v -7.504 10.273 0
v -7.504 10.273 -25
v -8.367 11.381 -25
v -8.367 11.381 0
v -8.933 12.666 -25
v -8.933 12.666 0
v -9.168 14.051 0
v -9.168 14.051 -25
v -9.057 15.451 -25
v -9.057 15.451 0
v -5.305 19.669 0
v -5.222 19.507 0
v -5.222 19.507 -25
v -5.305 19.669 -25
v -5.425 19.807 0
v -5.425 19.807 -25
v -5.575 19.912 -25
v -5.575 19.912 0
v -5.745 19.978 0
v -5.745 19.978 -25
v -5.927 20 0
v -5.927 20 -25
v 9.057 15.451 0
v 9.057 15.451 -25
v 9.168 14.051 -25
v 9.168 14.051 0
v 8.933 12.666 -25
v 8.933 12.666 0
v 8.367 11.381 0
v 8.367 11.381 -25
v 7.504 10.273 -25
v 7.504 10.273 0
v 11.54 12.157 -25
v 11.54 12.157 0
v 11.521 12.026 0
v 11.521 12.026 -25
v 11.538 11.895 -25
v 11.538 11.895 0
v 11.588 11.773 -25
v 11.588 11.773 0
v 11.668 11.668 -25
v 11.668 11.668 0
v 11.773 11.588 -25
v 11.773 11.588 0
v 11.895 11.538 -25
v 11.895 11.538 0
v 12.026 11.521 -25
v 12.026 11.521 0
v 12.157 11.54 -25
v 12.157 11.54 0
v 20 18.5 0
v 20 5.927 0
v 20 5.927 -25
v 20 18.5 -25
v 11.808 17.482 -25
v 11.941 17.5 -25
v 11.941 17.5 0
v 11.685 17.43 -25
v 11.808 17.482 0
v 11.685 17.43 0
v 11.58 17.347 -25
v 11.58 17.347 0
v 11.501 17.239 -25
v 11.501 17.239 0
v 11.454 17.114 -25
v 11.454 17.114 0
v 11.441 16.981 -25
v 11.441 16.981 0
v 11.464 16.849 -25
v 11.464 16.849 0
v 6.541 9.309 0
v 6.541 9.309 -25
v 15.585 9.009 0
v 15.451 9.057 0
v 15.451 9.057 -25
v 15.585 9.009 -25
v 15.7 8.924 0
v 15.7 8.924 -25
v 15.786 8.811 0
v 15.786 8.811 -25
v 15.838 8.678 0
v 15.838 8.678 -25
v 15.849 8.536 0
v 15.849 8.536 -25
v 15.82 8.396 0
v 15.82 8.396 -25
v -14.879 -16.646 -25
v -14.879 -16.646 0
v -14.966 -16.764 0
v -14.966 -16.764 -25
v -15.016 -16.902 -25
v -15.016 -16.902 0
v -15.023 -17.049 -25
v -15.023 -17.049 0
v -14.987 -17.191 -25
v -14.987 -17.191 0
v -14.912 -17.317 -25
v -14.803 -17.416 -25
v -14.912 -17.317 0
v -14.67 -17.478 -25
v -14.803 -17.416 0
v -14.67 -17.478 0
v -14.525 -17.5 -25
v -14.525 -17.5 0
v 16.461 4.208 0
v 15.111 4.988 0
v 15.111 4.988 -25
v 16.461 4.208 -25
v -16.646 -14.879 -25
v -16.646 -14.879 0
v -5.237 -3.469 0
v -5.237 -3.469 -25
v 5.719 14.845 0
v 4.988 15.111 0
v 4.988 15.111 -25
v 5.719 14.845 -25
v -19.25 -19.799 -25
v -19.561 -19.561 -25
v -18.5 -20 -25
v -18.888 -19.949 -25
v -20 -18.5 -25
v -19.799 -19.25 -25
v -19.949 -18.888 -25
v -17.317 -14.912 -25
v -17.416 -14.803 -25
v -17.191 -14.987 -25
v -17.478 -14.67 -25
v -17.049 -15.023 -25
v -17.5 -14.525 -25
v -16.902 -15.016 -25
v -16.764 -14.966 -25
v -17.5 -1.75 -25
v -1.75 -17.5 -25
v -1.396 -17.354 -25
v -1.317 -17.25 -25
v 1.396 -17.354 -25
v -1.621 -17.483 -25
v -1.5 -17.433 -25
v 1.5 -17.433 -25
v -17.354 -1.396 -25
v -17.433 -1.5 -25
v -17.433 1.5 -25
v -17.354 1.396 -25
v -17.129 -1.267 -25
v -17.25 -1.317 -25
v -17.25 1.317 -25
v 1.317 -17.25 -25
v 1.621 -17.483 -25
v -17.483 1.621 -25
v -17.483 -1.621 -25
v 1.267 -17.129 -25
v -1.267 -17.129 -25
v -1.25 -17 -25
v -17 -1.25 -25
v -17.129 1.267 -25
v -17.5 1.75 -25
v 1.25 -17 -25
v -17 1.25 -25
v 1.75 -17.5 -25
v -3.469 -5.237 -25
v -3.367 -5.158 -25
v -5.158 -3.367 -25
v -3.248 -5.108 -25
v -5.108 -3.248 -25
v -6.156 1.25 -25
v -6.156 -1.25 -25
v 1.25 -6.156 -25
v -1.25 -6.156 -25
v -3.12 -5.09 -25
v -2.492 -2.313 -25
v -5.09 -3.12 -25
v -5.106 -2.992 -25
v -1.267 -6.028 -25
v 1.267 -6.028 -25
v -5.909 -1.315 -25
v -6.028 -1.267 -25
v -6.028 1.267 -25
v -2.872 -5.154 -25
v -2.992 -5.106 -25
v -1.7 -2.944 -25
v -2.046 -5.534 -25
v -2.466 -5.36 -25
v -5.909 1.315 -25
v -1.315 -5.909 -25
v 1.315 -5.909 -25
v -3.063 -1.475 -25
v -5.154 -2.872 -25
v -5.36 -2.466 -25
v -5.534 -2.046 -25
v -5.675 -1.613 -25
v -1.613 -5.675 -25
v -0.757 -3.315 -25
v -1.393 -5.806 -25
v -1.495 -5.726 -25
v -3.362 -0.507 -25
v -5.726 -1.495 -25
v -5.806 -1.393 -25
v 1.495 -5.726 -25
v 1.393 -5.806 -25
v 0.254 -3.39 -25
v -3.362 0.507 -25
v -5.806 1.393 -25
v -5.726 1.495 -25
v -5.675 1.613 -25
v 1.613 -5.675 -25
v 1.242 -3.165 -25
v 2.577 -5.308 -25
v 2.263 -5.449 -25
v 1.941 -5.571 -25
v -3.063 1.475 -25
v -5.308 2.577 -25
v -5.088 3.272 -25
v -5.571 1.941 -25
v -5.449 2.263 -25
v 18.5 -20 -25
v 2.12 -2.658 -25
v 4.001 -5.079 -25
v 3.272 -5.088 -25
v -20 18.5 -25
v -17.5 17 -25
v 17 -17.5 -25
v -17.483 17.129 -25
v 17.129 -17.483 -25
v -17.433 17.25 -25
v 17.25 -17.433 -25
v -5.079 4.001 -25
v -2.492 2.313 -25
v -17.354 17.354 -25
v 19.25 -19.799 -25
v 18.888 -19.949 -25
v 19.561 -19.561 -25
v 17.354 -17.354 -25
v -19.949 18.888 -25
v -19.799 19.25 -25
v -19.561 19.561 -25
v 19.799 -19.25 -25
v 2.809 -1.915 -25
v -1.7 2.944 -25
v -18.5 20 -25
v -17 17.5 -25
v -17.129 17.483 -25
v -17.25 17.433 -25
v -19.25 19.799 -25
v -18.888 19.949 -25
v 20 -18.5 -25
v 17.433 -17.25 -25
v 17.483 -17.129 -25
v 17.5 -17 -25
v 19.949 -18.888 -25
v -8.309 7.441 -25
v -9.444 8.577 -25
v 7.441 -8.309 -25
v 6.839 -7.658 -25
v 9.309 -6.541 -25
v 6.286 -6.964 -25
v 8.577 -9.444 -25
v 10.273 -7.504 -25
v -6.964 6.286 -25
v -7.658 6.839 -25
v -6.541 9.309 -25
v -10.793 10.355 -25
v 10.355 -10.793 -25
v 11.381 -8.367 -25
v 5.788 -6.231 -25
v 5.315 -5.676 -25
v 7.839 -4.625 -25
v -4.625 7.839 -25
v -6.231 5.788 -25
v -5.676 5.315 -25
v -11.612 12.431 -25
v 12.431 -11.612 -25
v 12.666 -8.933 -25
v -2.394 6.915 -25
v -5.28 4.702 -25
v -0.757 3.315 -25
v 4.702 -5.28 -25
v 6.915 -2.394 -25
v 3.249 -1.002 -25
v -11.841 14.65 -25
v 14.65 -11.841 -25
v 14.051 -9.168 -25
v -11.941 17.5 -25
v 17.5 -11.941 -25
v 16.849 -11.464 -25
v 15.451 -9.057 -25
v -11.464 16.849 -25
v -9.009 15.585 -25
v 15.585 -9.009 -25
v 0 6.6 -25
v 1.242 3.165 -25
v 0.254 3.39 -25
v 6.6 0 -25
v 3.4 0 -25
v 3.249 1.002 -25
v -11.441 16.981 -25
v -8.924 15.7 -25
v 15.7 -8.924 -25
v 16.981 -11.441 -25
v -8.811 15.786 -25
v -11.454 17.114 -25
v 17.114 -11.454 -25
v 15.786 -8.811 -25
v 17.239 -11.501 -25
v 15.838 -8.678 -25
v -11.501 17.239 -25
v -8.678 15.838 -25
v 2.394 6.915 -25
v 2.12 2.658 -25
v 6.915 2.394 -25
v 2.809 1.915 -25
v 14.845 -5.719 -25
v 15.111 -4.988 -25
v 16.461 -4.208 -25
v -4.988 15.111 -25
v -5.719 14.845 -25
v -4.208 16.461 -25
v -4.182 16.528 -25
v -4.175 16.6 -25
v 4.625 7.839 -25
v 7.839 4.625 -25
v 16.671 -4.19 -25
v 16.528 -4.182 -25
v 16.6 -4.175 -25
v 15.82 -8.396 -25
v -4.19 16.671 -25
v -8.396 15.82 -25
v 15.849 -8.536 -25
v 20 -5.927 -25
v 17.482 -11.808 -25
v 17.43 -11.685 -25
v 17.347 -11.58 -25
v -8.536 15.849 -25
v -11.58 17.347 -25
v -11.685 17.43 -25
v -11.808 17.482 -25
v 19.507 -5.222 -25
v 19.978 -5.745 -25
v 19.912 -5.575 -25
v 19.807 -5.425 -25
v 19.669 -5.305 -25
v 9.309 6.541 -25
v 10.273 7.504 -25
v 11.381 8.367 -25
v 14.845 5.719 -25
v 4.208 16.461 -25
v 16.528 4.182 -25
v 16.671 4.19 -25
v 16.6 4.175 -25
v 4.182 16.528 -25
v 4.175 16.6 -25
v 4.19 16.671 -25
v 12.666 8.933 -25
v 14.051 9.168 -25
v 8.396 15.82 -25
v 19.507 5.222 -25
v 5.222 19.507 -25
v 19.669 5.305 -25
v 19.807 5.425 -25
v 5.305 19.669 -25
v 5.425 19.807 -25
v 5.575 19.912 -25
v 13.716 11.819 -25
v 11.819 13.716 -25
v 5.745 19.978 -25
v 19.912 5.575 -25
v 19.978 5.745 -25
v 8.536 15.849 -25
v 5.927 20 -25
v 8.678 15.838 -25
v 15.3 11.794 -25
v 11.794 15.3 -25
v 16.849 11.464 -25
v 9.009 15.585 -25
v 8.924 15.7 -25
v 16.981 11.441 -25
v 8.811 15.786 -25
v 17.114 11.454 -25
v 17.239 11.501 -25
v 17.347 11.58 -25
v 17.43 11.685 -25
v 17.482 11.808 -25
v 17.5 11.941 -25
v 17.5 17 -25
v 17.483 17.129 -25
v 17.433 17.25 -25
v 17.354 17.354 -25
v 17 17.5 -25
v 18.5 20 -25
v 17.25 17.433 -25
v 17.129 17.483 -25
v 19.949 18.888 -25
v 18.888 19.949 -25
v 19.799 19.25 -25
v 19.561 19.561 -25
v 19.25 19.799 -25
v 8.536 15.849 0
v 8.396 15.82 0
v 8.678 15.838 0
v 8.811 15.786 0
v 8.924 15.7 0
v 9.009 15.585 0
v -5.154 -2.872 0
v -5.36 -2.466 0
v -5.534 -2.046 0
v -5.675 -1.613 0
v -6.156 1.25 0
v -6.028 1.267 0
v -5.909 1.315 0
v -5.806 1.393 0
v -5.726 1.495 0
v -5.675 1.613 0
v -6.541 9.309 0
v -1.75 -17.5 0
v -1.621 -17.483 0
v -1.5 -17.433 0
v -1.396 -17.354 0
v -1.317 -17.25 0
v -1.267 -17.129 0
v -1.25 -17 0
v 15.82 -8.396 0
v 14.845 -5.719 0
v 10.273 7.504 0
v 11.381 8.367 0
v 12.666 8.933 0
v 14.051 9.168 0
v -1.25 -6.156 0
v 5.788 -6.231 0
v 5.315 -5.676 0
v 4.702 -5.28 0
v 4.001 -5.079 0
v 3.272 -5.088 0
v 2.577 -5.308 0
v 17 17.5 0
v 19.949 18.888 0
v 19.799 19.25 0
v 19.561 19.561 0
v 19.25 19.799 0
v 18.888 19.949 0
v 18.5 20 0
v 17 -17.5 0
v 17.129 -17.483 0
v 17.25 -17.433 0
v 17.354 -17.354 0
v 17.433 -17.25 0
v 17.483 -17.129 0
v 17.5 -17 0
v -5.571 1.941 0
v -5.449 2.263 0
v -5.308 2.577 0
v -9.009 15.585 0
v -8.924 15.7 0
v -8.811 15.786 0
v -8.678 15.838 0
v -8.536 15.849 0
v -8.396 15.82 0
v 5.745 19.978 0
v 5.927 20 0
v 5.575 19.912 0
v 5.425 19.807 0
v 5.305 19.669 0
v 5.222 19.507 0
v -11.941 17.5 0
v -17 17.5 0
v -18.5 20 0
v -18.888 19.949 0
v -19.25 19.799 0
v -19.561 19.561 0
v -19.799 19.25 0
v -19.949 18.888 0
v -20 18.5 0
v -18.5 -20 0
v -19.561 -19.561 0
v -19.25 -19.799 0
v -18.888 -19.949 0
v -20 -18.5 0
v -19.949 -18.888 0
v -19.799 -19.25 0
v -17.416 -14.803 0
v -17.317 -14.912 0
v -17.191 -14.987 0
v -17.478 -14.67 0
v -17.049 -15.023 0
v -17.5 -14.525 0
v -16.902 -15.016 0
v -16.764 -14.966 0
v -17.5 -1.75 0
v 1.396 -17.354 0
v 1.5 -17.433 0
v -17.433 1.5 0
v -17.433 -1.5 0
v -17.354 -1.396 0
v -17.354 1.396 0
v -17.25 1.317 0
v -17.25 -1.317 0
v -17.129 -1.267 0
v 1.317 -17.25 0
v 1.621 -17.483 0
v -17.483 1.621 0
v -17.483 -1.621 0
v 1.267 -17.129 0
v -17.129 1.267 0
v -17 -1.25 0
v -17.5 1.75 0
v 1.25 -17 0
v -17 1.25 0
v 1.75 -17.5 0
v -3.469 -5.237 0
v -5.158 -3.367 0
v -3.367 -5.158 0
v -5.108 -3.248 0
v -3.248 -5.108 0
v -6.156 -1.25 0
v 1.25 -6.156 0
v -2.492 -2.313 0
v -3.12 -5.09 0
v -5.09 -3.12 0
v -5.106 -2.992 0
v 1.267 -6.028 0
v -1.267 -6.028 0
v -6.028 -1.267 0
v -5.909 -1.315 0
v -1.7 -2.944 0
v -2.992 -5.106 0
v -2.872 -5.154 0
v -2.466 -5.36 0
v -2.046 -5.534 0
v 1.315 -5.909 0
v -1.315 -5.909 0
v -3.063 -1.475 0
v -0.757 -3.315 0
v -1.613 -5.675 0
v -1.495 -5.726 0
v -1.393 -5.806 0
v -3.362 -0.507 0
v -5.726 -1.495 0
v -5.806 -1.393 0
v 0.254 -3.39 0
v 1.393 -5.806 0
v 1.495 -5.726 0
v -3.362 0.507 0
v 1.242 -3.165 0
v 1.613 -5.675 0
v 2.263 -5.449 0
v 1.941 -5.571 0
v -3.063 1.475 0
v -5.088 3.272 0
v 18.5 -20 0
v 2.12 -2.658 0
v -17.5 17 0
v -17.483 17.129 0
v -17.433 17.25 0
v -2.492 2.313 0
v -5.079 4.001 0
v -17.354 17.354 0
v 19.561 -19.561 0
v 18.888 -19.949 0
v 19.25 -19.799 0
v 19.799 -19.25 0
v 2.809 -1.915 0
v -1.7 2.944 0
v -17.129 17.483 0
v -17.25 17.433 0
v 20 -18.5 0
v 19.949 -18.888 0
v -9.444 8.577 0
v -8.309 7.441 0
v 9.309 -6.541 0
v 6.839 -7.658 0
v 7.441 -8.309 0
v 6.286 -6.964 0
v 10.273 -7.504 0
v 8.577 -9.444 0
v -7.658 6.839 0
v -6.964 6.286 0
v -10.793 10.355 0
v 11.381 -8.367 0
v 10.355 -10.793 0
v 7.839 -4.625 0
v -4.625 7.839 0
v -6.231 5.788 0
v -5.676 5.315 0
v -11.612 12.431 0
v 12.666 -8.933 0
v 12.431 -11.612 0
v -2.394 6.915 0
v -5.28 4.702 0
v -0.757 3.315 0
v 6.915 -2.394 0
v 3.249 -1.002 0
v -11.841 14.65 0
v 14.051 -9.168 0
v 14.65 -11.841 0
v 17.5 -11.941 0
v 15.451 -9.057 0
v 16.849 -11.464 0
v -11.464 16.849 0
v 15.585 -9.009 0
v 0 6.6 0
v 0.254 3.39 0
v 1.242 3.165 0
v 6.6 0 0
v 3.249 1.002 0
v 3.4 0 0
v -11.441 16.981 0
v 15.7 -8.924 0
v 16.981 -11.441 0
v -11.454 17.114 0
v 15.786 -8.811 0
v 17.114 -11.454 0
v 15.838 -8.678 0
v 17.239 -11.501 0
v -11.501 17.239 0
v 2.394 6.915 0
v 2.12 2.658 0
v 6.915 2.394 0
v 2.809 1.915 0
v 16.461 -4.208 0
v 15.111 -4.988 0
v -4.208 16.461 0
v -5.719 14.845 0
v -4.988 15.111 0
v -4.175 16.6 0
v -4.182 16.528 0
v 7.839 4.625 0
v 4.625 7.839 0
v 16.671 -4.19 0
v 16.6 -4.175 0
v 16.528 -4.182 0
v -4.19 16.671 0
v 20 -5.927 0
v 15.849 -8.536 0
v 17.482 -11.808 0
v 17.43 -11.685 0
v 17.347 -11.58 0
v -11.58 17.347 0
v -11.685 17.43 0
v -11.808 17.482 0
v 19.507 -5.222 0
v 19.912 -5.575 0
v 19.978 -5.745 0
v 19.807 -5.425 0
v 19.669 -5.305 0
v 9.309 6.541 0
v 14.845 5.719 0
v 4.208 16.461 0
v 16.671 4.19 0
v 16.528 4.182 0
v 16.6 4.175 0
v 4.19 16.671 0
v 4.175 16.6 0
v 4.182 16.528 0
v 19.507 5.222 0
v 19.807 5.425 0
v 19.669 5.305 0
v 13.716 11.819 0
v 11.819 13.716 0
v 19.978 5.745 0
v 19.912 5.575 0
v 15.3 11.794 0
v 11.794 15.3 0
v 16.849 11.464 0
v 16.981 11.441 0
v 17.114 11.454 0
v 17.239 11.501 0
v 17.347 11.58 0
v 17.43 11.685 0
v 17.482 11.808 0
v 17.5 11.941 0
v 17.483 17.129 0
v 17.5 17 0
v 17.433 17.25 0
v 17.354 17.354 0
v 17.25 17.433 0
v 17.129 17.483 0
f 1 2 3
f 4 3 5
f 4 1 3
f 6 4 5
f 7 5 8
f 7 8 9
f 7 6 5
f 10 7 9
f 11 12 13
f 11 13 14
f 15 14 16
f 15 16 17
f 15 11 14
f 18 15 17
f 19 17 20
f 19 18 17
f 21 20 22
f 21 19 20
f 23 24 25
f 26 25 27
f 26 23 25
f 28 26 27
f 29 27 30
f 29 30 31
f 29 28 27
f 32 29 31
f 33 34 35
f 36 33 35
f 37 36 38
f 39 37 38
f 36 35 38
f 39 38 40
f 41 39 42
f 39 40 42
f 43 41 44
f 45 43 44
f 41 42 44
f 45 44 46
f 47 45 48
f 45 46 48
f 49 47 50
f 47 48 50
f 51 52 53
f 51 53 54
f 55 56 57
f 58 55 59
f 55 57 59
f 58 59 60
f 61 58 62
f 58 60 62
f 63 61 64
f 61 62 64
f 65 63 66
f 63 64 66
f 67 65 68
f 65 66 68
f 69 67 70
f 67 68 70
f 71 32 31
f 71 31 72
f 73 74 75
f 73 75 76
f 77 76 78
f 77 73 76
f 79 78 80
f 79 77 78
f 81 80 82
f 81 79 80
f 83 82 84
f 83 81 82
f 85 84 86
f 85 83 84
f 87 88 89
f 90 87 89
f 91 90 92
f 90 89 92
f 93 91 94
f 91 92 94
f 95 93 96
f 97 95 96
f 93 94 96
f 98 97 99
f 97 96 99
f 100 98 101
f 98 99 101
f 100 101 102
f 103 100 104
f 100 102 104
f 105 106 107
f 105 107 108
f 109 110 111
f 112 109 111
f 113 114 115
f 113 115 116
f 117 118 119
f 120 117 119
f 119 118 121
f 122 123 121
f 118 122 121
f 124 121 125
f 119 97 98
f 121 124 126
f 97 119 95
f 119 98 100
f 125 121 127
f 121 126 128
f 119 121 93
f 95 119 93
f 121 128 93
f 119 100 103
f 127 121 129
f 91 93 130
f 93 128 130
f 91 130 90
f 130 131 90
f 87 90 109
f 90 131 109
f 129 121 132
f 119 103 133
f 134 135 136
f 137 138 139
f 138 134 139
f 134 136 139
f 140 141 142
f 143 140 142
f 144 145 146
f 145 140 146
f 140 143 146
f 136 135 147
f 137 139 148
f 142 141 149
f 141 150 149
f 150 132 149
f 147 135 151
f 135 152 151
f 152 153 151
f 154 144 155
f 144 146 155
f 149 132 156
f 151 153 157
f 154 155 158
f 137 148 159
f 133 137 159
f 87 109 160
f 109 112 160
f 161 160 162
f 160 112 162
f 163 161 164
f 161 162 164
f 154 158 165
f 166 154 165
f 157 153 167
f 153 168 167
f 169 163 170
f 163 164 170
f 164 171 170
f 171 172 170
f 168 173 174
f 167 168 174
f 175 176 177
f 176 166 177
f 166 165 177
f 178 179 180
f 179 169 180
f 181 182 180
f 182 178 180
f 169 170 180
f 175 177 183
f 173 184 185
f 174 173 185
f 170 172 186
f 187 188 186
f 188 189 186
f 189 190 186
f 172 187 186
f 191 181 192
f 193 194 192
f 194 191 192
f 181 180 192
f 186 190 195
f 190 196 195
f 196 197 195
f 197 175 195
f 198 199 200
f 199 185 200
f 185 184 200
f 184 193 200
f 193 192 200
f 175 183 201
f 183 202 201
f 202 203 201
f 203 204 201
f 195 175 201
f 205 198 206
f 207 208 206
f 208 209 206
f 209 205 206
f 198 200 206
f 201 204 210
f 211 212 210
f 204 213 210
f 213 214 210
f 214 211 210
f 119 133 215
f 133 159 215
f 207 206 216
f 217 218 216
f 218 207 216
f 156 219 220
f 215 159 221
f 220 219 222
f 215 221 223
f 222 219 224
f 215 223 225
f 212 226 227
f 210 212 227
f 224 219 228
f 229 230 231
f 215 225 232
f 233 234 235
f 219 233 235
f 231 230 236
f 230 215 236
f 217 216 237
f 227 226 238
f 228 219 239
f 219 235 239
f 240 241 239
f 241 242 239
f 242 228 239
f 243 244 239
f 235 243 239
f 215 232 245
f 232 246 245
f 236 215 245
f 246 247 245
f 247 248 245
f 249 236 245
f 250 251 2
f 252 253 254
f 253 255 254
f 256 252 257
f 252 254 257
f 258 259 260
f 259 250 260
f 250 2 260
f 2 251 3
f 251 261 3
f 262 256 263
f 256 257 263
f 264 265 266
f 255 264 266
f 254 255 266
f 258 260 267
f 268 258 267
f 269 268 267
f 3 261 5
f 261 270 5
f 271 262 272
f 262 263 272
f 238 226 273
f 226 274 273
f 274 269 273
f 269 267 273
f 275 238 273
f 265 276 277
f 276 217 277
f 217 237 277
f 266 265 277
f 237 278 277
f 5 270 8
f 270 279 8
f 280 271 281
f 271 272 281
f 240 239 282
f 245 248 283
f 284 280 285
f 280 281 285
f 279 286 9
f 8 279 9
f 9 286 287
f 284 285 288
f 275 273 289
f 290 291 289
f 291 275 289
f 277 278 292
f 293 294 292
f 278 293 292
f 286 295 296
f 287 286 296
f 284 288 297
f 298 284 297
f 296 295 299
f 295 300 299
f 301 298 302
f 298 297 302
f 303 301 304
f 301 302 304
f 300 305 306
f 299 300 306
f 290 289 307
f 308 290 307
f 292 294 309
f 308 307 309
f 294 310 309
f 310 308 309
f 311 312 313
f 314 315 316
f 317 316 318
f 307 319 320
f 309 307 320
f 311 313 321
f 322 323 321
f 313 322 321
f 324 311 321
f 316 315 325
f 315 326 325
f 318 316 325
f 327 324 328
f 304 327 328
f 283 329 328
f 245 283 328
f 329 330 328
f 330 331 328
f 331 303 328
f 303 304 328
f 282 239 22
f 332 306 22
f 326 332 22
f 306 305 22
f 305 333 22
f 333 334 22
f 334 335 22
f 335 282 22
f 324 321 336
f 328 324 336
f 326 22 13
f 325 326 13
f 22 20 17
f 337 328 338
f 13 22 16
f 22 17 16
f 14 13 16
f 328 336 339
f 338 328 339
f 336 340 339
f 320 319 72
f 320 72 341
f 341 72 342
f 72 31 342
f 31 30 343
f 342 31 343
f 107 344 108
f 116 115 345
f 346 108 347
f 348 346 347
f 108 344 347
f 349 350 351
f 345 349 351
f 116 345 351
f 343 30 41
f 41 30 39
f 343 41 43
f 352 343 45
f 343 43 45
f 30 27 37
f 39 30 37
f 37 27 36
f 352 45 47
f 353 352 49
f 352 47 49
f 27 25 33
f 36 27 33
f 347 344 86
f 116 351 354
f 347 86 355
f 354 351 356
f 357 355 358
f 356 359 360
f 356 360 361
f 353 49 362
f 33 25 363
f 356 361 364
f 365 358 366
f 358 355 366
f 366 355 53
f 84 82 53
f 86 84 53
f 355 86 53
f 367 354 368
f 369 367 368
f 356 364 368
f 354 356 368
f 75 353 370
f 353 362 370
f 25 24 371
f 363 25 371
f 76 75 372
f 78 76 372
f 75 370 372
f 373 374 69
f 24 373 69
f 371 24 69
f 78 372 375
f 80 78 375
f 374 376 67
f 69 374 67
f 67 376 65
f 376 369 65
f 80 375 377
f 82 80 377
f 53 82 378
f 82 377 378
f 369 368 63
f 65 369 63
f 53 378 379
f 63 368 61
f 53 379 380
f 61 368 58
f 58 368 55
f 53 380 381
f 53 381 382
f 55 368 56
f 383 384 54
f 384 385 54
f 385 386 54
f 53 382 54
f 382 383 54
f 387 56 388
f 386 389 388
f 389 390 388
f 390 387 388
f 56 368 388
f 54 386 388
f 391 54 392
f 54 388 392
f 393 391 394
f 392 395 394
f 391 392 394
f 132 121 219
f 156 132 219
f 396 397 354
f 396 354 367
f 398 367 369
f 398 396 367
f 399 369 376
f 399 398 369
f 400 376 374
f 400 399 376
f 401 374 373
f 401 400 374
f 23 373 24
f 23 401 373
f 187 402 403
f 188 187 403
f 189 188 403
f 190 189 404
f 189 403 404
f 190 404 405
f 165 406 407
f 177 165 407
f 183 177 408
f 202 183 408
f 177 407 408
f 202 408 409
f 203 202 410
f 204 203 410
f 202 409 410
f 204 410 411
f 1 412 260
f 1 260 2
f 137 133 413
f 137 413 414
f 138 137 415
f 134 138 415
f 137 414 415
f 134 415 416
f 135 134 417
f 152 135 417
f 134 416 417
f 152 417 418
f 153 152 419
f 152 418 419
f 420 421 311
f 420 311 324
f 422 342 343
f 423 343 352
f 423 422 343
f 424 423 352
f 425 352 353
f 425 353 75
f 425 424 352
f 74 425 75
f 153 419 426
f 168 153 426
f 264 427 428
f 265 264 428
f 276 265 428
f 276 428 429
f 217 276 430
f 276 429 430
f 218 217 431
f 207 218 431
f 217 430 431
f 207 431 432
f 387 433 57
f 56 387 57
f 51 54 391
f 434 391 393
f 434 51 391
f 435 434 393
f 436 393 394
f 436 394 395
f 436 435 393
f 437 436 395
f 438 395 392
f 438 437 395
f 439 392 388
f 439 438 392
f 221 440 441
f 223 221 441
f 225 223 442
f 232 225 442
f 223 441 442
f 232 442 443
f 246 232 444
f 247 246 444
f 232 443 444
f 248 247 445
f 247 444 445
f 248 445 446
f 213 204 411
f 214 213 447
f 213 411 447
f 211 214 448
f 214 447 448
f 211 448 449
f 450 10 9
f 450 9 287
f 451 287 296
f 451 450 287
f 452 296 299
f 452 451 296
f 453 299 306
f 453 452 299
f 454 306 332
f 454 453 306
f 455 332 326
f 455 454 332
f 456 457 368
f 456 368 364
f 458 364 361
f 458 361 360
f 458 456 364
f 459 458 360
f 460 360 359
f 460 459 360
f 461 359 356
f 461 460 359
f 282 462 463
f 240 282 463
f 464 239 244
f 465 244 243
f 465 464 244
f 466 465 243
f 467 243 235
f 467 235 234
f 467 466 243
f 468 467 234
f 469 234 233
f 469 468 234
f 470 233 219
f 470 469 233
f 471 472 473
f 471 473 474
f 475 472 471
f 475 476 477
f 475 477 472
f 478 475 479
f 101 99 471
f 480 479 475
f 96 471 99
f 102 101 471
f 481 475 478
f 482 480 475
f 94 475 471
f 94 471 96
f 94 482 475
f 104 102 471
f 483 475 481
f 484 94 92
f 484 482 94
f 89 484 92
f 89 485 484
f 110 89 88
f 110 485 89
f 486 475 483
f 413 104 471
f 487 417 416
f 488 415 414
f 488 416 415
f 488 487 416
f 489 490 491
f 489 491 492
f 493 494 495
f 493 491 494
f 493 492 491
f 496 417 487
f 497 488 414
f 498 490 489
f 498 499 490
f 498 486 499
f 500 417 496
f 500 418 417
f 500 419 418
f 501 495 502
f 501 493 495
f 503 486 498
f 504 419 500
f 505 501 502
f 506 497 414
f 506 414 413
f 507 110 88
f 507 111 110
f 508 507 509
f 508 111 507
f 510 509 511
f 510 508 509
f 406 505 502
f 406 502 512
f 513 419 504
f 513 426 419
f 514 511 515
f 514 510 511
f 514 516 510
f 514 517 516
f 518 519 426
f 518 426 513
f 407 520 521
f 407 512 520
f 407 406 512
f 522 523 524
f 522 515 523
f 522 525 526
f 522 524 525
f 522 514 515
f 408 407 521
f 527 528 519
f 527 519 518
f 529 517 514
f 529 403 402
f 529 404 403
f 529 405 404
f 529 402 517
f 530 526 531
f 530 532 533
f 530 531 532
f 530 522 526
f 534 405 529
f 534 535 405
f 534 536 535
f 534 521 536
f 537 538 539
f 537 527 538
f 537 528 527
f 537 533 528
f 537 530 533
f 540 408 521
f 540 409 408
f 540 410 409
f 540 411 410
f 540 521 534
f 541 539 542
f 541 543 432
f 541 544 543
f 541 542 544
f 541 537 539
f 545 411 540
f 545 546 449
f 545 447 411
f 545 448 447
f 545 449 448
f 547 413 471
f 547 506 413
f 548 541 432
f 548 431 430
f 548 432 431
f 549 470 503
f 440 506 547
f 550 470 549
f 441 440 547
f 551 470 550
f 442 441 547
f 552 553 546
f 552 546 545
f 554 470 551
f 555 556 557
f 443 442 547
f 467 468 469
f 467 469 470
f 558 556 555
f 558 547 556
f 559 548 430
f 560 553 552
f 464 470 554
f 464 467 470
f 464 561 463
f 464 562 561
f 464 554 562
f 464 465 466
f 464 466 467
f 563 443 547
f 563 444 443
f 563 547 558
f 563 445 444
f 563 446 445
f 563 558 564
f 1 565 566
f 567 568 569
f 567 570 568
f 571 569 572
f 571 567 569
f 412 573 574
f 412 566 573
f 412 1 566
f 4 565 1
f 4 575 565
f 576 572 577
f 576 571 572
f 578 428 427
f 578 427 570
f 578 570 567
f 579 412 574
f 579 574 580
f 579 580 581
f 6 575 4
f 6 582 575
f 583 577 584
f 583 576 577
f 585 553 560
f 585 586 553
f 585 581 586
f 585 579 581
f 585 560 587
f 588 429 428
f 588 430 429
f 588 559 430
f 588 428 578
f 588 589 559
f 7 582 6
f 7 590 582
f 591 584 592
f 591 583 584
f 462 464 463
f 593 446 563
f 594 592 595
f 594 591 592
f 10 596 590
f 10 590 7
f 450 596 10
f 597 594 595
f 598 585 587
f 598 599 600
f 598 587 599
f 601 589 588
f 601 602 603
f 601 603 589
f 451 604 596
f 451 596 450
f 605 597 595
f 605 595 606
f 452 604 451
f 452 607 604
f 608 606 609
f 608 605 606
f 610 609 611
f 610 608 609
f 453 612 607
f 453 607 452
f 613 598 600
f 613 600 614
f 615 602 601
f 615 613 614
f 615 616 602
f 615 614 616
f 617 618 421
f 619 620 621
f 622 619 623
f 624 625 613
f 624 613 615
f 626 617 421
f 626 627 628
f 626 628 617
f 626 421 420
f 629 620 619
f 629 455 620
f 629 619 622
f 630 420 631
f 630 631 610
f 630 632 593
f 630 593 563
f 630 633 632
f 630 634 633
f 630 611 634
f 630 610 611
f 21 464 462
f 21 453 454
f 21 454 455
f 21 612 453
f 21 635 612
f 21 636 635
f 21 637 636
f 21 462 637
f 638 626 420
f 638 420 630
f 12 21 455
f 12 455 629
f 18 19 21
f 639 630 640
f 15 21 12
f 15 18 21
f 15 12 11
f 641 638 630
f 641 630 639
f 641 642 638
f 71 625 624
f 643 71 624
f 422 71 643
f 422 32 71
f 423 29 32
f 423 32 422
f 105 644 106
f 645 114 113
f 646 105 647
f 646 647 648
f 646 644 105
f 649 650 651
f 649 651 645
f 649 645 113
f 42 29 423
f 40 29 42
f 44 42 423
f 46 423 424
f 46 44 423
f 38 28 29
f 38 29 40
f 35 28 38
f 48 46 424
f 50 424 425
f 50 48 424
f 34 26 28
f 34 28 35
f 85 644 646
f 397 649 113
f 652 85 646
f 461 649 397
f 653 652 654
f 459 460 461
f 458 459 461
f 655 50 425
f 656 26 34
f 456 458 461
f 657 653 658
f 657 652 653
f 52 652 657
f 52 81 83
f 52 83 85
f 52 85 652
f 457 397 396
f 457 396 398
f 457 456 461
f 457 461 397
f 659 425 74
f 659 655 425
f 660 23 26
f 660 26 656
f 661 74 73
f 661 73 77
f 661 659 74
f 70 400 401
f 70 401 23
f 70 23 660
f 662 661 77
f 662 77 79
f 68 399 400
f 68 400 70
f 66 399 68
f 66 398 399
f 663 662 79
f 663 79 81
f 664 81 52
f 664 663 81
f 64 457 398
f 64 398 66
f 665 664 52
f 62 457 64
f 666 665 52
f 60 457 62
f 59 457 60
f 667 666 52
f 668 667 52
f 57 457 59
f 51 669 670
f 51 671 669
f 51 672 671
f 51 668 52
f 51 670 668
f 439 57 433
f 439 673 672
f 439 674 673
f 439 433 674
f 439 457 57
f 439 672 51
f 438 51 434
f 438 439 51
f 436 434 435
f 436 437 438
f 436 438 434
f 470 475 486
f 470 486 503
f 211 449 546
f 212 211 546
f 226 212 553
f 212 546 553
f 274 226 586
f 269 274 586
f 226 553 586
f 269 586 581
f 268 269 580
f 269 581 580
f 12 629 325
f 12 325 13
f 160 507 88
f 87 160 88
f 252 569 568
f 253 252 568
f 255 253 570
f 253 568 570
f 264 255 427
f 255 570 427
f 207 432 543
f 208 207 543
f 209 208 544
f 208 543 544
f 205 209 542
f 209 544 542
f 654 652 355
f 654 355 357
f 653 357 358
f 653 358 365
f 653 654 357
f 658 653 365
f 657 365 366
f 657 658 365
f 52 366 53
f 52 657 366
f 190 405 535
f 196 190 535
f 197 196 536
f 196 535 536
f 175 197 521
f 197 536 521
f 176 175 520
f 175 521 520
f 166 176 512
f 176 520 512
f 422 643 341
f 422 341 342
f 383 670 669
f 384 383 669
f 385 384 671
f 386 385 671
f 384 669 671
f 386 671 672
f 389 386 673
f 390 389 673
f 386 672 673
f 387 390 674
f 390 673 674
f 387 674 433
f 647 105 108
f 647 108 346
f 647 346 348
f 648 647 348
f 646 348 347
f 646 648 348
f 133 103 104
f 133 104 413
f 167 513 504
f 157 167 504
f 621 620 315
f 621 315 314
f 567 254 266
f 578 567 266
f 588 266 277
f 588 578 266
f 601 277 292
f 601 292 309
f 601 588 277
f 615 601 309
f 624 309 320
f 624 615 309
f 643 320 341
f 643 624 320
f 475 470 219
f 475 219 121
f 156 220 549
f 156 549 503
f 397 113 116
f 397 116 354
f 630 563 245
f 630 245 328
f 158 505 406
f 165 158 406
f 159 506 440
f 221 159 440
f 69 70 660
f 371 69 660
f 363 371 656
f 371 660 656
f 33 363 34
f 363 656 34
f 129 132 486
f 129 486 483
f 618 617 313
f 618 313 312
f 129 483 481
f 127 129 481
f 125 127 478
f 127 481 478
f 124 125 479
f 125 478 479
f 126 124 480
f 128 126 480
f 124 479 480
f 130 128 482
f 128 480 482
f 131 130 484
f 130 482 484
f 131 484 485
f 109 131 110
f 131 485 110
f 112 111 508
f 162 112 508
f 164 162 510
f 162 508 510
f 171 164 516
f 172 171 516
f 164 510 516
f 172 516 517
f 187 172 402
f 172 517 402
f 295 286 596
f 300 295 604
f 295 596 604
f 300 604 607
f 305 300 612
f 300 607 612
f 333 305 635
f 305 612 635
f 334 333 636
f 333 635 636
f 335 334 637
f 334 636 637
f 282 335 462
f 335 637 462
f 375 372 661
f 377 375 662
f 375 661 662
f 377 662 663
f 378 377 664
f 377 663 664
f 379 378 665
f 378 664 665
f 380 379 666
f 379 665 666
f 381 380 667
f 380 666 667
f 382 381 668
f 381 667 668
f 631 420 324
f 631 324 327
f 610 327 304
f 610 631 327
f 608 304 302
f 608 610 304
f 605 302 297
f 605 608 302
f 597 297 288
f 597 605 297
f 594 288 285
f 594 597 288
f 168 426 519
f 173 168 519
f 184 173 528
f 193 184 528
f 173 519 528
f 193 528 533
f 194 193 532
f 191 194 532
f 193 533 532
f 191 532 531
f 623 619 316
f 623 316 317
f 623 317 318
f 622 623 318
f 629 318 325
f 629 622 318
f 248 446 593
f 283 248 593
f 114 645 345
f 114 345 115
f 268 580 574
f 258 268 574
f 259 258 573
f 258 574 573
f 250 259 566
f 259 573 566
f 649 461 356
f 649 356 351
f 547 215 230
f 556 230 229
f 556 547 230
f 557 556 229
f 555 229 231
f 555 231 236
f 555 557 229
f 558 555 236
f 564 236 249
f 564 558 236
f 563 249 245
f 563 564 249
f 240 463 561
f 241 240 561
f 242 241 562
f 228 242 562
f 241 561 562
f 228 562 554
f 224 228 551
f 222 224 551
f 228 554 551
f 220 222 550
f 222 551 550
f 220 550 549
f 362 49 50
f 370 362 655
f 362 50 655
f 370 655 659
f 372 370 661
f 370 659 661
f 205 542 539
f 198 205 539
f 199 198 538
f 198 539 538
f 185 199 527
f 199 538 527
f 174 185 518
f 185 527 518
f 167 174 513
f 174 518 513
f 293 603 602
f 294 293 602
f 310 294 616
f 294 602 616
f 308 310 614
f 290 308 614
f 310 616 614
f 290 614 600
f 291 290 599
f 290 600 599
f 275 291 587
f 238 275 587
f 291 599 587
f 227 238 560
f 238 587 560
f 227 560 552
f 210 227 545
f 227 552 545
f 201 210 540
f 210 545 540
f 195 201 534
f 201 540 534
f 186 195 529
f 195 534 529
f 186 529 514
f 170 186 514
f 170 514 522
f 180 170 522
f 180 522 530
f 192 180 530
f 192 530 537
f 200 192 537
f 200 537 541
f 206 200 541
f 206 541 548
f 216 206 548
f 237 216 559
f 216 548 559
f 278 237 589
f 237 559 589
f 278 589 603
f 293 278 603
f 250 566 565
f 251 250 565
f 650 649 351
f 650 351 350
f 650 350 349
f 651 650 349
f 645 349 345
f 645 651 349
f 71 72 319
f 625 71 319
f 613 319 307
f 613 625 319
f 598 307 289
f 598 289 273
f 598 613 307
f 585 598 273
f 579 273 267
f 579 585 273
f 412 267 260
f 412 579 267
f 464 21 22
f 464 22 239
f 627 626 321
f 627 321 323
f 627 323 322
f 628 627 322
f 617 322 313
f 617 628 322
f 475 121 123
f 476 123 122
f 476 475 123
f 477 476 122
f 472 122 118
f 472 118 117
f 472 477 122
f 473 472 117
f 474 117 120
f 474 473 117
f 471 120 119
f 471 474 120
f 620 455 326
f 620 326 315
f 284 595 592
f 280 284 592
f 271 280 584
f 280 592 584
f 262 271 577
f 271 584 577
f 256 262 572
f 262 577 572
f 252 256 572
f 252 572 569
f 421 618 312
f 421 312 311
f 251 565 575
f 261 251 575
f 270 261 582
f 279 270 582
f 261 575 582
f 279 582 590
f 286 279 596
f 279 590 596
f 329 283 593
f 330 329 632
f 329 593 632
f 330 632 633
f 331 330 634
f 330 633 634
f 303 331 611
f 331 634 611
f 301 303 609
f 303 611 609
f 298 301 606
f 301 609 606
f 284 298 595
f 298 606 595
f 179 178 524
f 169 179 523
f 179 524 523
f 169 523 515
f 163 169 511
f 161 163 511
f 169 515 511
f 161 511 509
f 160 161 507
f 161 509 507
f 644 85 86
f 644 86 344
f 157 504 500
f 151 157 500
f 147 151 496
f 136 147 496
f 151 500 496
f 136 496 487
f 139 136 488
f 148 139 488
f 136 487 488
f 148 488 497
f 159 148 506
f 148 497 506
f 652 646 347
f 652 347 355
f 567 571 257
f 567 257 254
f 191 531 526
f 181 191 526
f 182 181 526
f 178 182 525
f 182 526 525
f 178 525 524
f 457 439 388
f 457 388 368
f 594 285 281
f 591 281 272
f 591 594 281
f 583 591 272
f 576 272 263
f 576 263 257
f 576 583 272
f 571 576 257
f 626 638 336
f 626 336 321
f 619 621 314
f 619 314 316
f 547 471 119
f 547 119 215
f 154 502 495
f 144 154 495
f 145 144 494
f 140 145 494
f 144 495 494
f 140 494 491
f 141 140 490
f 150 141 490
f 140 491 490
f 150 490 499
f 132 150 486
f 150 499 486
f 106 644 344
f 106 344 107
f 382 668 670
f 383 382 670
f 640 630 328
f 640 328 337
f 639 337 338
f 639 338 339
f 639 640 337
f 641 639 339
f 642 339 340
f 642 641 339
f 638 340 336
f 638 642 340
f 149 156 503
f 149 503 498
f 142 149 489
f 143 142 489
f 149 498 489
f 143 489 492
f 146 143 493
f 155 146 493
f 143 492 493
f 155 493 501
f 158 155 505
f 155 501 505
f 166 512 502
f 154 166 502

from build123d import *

# Parameters (mm, degrees)
SK_MAIN_EXTRUSION_R  = 3.4
MAIN_EXTRUSION_DEPTH = 25


with BuildPart() as part:
    # Sk Main Extrusion → Main Extrusion (new body)
    with BuildSketch(Plane.XY):
        with BuildLine():
            Line((16.671180212, 4.190076845), (19.506515107, 5.222054351))
            ThreePointArc((19.506515107, 5.222054351), (19.864364033, 5.496641489), (20, 5.926823816))
            Line((20, 5.926823816), (20, 18.5))
            ThreePointArc((20, 18.5), (19.560660172, 19.560660172), (18.5, 20))
            Line((18.5, 20), (5.926823816, 20))
            ThreePointArc((5.926823816, 20), (5.496641489, 19.864364033), (5.222054351, 19.506515107))
            Line((5.222054351, 19.506515107), (4.190076845, 16.671180212))
            ThreePointArc((4.190076845, 16.671180212), (4.175951325, 16.563886241), (4.208493649, 16.460675177))
            Line((4.208493649, 16.460675177), (4.987558066, 15.111296024))
            Line((4.987558066, 15.111296024), (5.718509166, 14.845251581))
            Line((5.718509166, 14.845251581), (8.396186179, 15.81984631))
            ThreePointArc((8.396186179, 15.81984631), (8.811074612, 15.786489799), (9.056960151, 15.450654467))
            ThreePointArc((9.056960151, 15.450654467), (8.933433013, 12.665882372), (7.504160339, 10.272684887))
            Line((7.504160339, 10.272684887), (6.540737726, 9.309262274))
            ThreePointArc((6.540737726, 9.309262274), (0, 6.6), (-6.540737726, 9.309262274))
            Line((-6.540737726, 9.309262274), (-7.504160339, 10.272684887))
            ThreePointArc((-7.504160339, 10.272684887), (-8.933433013, 12.665882372), (-9.056960151, 15.450654467))
            ThreePointArc((-9.056960151, 15.450654467), (-8.811074612, 15.786489799), (-8.396186179, 15.81984631))
            Line((-8.396186179, 15.81984631), (-5.718509166, 14.845251581))
            Line((-5.718509166, 14.845251581), (-4.987558066, 15.111296024))
            Line((-4.987558066, 15.111296024), (-4.208493649, 16.460675177))
            ThreePointArc((-4.208493649, 16.460675177), (-4.175951325, 16.563886241), (-4.190076845, 16.671180212))
            Line((-4.190076845, 16.671180212), (-5.222054351, 19.506515107))
            ThreePointArc((-5.222054351, 19.506515107), (-5.496641489, 19.864364033), (-5.926823816, 20))
            Line((-5.926823816, 20), (-18.5, 20))
            ThreePointArc((-18.5, 20), (-19.560660172, 19.560660172), (-20, 18.5))
            Line((-20, 18.5), (-20, -18.5))
            ThreePointArc((-20, -18.5), (-19.560660172, -19.560660172), (-18.5, -20))
            Line((-18.5, -20), (18.5, -20))
            ThreePointArc((18.5, -20), (19.560660172, -19.560660172), (20, -18.5))
            Line((20, -18.5), (20, -5.926823816))
            ThreePointArc((20, -5.926823816), (19.864364033, -5.496641489), (19.506515107, -5.222054351))
            Line((19.506515107, -5.222054351), (16.671180212, -4.190076845))
            ThreePointArc((16.671180212, -4.190076845), (16.563886241, -4.175951325), (16.460675177, -4.208493649))
            Line((16.460675177, -4.208493649), (15.111296024, -4.987558066))
            Line((15.111296024, -4.987558066), (14.845251581, -5.718509166))
            Line((14.845251581, -5.718509166), (15.81984631, -8.396186179))
            ThreePointArc((15.81984631, -8.396186179), (15.786489799, -8.811074612), (15.450654467, -9.056960151))
            ThreePointArc((15.450654467, -9.056960151), (12.665882372, -8.933433013), (10.272684887, -7.504160339))
            Line((10.272684887, -7.504160339), (9.309262274, -6.540737726))
            ThreePointArc((9.309262274, -6.540737726), (6.6, 0), (9.309262274, 6.540737726))
            Line((9.309262274, 6.540737726), (10.272684887, 7.504160339))
            ThreePointArc((10.272684887, 7.504160339), (12.665882372, 8.933433013), (15.450654467, 9.056960151))
            ThreePointArc((15.450654467, 9.056960151), (15.786489799, 8.811074612), (15.81984631, 8.396186179))
            Line((15.81984631, 8.396186179), (14.845251581, 5.718509166))
            Line((14.845251581, 5.718509166), (15.111296024, 4.987558066))
            Line((15.111296024, 4.987558066), (16.460675177, 4.208493649))
            ThreePointArc((16.460675177, 4.208493649), (16.563886241, 4.175951325), (16.671180212, 4.190076845))
        make_face()
        Circle(SK_MAIN_EXTRUSION_R, mode=Mode.SUBTRACT)
        with BuildLine():
            Line((-8.308504679, 7.441495321), (-9.444282589, 8.577273231))
            ThreePointArc((-9.444282589, 8.577273231), (-11.611987193, 12.430514315), (-11.464011904, 16.849169473))
            ThreePointArc((-11.464011904, 16.849169473), (-11.537349181, 17.295452819), (-11.940719521, 17.5))
            Line((-11.940719521, 17.5), (-17, 17.5))
            ThreePointArc((-17, 17.5), (-17.353553391, 17.353553391), (-17.5, 17))
            Line((-17.5, 17), (-17.5, 1.75))
            ThreePointArc((-17.5, 1.75), (-17.353553391, 1.396446609), (-17, 1.25))
            Line((-17, 1.25), (-6.156094541, 1.25))
            ThreePointArc((-6.156094541, 1.25), (-5.854730455, 1.351026708), (-5.675149655, 1.61328125))
            ThreePointArc((-5.675149655, 1.61328125), (-5.51245547, 2.10305366), (-5.307583096, 2.576734694))
            ThreePointArc((-5.307583096, 2.576734694), (-5.153883821, 4.359333373), (-6.230846881, 5.788120301))
            ThreePointArc((-6.230846881, 5.788120301), (-7.316529108, 6.555931161), (-8.308504679, 7.441495321))
        make_face(mode=Mode.SUBTRACT)
        with BuildLine():
            Line((17.5, 11.940719521), (17.5, 17))
            ThreePointArc((17.5, 17), (17.353553391, 17.353553391), (17, 17.5))
            Line((17, 17.5), (11.940719521, 17.5))
            ThreePointArc((11.940719521, 17.5), (11.537349181, 17.295452819), (11.464011904, 16.849169473))
            ThreePointArc((11.464011904, 16.849169473), (11.844928721, 14.508523804), (11.540116235, 12.156756572))
            ThreePointArc((11.540116235, 12.156756572), (11.66791097, 11.66791097), (12.156756572, 11.540116235))
            ThreePointArc((12.156756572, 11.540116235), (14.508523804, 11.844928721), (16.849169473, 11.464011904))
            ThreePointArc((16.849169473, 11.464011904), (17.295452819, 11.537349181), (17.5, 11.940719521))
        make_face(mode=Mode.SUBTRACT)
        with BuildLine():
            Line((-17.5, -1.75), (-17.5, -14.525126266))
            ThreePointArc((-17.5, -14.525126266), (-17.191341716, -14.987066032), (-16.646446609, -14.878679656))
            Line((-16.646446609, -14.878679656), (-5.236899672, -3.469132719))
            ThreePointArc((-5.236899672, -3.469132719), (-5.095239754, -3.18459946), (-5.153698917, -2.872174694))
            ThreePointArc((-5.153698917, -2.872174694), (-5.450889242, -2.257832251), (-5.675149655, -1.61328125))
            ThreePointArc((-5.675149655, -1.61328125), (-5.854730455, -1.351026708), (-6.156094541, -1.25))
            Line((-6.156094541, -1.25), (-17, -1.25))
            ThreePointArc((-17, -1.25), (-17.353553391, -1.396446609), (-17.5, -1.75))
        make_face(mode=Mode.SUBTRACT)
        with BuildLine():
            Line((-14.525126266, -17.5), (-1.75, -17.5))
            ThreePointArc((-1.75, -17.5), (-1.396446609, -17.353553391), (-1.25, -17))
            Line((-1.25, -17), (-1.25, -6.156094541))
            ThreePointArc((-1.25, -6.156094541), (-1.351026708, -5.854730455), (-1.61328125, -5.675149655))
            ThreePointArc((-1.61328125, -5.675149655), (-2.257832251, -5.450889242), (-2.872174694, -5.153698917))
            ThreePointArc((-2.872174694, -5.153698917), (-3.18459946, -5.095239754), (-3.469132719, -5.236899672))
            Line((-3.469132719, -5.236899672), (-14.878679656, -16.646446609))
            ThreePointArc((-14.878679656, -16.646446609), (-14.987066032, -17.191341716), (-14.525126266, -17.5))
        make_face(mode=Mode.SUBTRACT)
        with BuildLine():
            Line((1.75, -17.5), (17, -17.5))
            ThreePointArc((17, -17.5), (17.353553391, -17.353553391), (17.5, -17))
            Line((17.5, -17), (17.5, -11.940719521))
            ThreePointArc((17.5, -11.940719521), (17.295452819, -11.537349181), (16.849169473, -11.464011904))
            ThreePointArc((16.849169473, -11.464011904), (12.430514315, -11.611987193), (8.577273231, -9.444282589))
            Line((8.577273231, -9.444282589), (7.441495321, -8.308504679))
            ThreePointArc((7.441495321, -8.308504679), (6.555931161, -7.316529108), (5.788120301, -6.230846881))
            ThreePointArc((5.788120301, -6.230846881), (4.359333373, -5.153883821), (2.576734694, -5.307583096))
            ThreePointArc((2.576734694, -5.307583096), (2.10305366, -5.51245547), (1.61328125, -5.675149655))
            ThreePointArc((1.61328125, -5.675149655), (1.351026708, -5.854730455), (1.25, -6.156094541))
            Line((1.25, -6.156094541), (1.25, -17))
            ThreePointArc((1.25, -17), (1.396446609, -17.353553391), (1.75, -17.5))
        make_face(mode=Mode.SUBTRACT)
    extrude(amount=-MAIN_EXTRUSION_DEPTH)


solid = part.part
